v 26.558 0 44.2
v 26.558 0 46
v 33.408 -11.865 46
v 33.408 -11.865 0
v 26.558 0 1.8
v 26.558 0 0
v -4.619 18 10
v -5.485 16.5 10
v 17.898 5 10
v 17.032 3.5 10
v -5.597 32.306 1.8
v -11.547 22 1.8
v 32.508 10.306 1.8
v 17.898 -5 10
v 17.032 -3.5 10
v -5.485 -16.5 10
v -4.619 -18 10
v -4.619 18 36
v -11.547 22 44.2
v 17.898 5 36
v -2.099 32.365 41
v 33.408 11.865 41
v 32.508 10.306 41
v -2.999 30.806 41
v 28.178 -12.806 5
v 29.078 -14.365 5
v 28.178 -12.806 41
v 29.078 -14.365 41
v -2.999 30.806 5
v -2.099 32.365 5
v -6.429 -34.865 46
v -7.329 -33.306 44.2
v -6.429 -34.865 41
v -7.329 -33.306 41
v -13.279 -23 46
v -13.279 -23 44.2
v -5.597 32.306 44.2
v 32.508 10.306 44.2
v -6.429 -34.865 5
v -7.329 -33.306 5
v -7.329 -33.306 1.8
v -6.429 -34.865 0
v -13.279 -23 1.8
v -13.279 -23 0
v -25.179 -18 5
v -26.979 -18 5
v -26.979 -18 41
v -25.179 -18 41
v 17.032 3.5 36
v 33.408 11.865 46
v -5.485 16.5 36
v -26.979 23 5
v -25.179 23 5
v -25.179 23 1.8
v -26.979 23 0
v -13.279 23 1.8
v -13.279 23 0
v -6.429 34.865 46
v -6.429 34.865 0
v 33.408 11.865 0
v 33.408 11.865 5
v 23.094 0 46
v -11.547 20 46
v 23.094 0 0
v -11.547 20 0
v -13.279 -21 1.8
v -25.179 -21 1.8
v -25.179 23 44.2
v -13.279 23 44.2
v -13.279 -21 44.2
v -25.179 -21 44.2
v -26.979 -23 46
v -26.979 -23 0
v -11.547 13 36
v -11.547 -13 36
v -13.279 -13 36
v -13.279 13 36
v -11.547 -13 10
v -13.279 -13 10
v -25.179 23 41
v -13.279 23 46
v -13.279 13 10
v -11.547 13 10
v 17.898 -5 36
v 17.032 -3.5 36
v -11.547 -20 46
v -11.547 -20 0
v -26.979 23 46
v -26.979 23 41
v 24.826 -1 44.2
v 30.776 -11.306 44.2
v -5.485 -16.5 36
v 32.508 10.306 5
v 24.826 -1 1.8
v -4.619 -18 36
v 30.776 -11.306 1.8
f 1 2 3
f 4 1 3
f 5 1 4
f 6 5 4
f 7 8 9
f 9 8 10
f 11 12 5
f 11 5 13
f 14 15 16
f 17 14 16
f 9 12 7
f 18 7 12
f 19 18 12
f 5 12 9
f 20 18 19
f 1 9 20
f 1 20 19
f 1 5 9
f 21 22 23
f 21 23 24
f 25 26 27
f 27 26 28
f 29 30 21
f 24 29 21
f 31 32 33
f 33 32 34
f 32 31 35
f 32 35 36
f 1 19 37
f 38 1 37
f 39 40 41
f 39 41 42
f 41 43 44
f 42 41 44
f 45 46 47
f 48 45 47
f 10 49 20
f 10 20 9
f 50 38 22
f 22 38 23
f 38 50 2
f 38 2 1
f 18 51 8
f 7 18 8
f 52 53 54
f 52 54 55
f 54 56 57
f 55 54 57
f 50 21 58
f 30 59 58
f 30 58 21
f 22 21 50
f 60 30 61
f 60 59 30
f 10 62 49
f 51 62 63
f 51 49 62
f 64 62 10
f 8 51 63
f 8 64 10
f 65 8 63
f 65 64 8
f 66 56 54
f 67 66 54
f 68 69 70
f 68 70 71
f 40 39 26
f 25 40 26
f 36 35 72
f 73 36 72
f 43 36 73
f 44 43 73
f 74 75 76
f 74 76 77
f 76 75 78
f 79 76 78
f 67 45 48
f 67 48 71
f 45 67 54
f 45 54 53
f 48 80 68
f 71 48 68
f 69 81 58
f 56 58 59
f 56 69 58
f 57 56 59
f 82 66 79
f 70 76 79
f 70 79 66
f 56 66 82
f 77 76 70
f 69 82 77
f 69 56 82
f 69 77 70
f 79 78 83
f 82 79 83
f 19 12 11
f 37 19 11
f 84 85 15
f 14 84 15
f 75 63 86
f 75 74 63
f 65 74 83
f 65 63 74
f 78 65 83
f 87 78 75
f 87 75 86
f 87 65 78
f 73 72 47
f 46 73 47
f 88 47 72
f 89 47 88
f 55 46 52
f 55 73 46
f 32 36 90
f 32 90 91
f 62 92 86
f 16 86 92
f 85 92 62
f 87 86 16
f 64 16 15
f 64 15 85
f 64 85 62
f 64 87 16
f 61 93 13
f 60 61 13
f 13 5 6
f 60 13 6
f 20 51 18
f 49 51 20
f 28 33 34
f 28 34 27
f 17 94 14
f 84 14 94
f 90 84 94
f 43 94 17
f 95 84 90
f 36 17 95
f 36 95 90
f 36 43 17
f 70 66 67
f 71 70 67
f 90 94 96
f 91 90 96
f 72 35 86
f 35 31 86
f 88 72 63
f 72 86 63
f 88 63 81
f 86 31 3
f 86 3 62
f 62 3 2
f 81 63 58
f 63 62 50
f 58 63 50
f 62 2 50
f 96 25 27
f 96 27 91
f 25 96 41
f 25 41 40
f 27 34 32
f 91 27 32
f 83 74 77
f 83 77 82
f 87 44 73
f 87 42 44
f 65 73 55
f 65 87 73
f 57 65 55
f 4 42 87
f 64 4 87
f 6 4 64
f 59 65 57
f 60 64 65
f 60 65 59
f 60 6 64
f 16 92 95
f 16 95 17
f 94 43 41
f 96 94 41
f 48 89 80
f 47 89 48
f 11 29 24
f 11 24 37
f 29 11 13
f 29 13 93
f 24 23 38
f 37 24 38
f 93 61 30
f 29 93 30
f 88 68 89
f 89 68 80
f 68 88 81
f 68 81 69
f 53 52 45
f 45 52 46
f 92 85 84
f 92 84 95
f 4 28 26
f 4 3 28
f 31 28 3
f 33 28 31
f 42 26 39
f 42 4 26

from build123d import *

# Parameters (mm, degrees)
PAD_DEPTH           = 46
SKETCH001_W         = 26
SKETCH001_H         = 26
POCKET_DEPTH        = 5
SKETCH002_W         = 26
SKETCH002_H         = 26
POCKET001_DEPTH     = 5
SKETCH003_W         = 26
SKETCH003_H         = 26
POCKET002_DEPTH     = 5
POCKET002_FACE2_W   = 46
POCKET002_FACE2_H   = 46
POCKET002_FACE2_W_2 = 26
POCKET002_FACE2_H_2 = 26
PAD001_DEPTH        = 13.7
PAD001_FACE1_W      = 46
PAD001_FACE1_H      = 46
PAD001_FACE1_W_2    = 26
PAD001_FACE1_H_2    = 26
PAD002_DEPTH        = 13.7
PAD002_FACE16_W     = 46
PAD002_FACE16_H     = 46
PAD002_FACE16_W_2   = 26
PAD002_FACE16_H_2   = 26
PAD003_DEPTH        = 13.7
SKETCH004_W         = 11.9
SKETCH004_H         = 42.4
POCKET003_DEPTH     = 44
SKETCH005_W         = 41
SKETCH005_H         = 36
POCKET004_DEPTH     = 5
SKETCH006_W         = 11.9
SKETCH006_H         = 42.4
POCKET005_DEPTH     = 44
SKETCH007_W         = 41
SKETCH007_H         = 36
POCKET006_DEPTH     = 5
SKETCH008_W         = 11.9
SKETCH008_H         = 42.4
POCKET007_DEPTH     = 44
SKETCH009_W         = 41
SKETCH009_H         = 36
POCKET008_DEPTH     = 5


with BuildPart() as part:
    # Sketch → Pad (new body)
    with BuildSketch(Plane.XY):
        Polygon((26.5581123827, 0), (-13.2790561914, 23), (-13.2790561914, -23), align=None)
        Polygon((23.0940107676, 0), (-11.5470053838, 20), (-11.5470053838, -20), align=None, mode=Mode.SUBTRACT)
    extrude(amount=PAD_DEPTH)

    # Sketch001 (on Face3 of Pad) → Pocket (cut)
    with BuildSketch(Plane(origin=(6.6395280957, -11.5, 0), x_dir=(0.8660254038, 0.5, 0), z_dir=(0.5, -0.8660254038, 0))):
        with Locations((0, 23)):
            Rectangle(SKETCH001_W, SKETCH001_H)
    extrude(amount=-POCKET_DEPTH, mode=Mode.SUBTRACT)

    # Sketch002 (on Face1 of Pocket) → Pocket001 (cut)
    with BuildSketch(Plane(origin=(6.6395280957, 11.5, 0), x_dir=(-0.8660254038, 0.5, 0), z_dir=(0.5, 0.8660254038, 0))):
        with Locations((0, 23)):
            Rectangle(SKETCH002_W, SKETCH002_H)
    extrude(amount=-POCKET001_DEPTH, mode=Mode.SUBTRACT)

    # Sketch003 (on Face5 of Pocket001) → Pocket002 (cut)
    with BuildSketch(Plane(origin=(-13.2790561914, 0, 0), x_dir=(0, -1, 0), z_dir=(-1, 0, 0))):
        with Locations((0, 23)):
            Rectangle(SKETCH003_W, SKETCH003_H)
    extrude(amount=-POCKET002_DEPTH, mode=Mode.SUBTRACT)

    # Pocket002 Face2 → Pad001 (add)
    with BuildSketch(Plane(origin=(6.6395280957, -11.5, 23), x_dir=(-0.8660254038, -0.5, 0), z_dir=(0.5, -0.8660254038, 0))):
        Rectangle(POCKET002_FACE2_W, POCKET002_FACE2_H)
        Rectangle(POCKET002_FACE2_W_2, POCKET002_FACE2_H_2, mode=Mode.SUBTRACT)
    extrude(amount=PAD001_DEPTH)

    # Pad001 Face1 → Pad002 (add)
    with BuildSketch(Plane(origin=(6.6395280957, 11.5, 23), x_dir=(0.8660254038, -0.5, 0), z_dir=(0.5, 0.8660254038, 0))):
        Rectangle(PAD001_FACE1_W, PAD001_FACE1_H)
        Rectangle(PAD001_FACE1_W_2, PAD001_FACE1_H_2, mode=Mode.SUBTRACT)
    extrude(amount=PAD002_DEPTH)

    # Pad002 Face16 → Pad003 (add)
    with BuildSketch(Plane(origin=(-13.2790561914, 0, 23), x_dir=(0, 1, 0), z_dir=(-1, 0, 0))):
        Rectangle(PAD002_FACE16_W, PAD002_FACE16_H)
        Rectangle(PAD002_FACE16_W_2, PAD002_FACE16_H_2, mode=Mode.SUBTRACT)
    extrude(amount=PAD003_DEPTH)

    # Sketch004 (on Face4 of Pad003) → Pocket003 (cut)
    with BuildSketch(Plane(origin=(19.918584287, -11.5, 0), x_dir=(0.5, 0.8660254038, 0), z_dir=(0.8660254038, -0.5, 0))):
        with Locations((19.2290561914, 23)):
            Rectangle(SKETCH004_W, SKETCH004_H)
    extrude(amount=-POCKET003_DEPTH, mode=Mode.SUBTRACT)

    # Sketch005 (on Face14 of Pocket003) → Pocket004 (cut)
    with BuildSketch(Plane(origin=(13.4895280957, 23.3645480318, 0), x_dir=(-0.8660254038, 0.5, 0), z_dir=(0.5, 0.8660254038, 0))):
        with Locations((-2.5, 23)):
            Rectangle(SKETCH005_W, SKETCH005_H)
    extrude(amount=-POCKET004_DEPTH, mode=Mode.SUBTRACT)

    # Sketch006 (on Face41 of Pocket004) → Pocket005 (cut)
    with BuildSketch(Plane(origin=(0, 23, 0), x_dir=(-1, 0, 0), z_dir=(0, 1, 0))):
        with Locations((19.2290561914, 23)):
            Rectangle(SKETCH006_W, SKETCH006_H)
    extrude(amount=-POCKET005_DEPTH, mode=Mode.SUBTRACT)

    # Sketch007 (on Face40 of Pocket005) → Pocket006 (cut)
    with BuildSketch(Plane(origin=(-26.9790561914, 0, 0), x_dir=(0, -1, 0), z_dir=(-1, 0, 0))):
        with Locations((-2.5, 23)):
            Rectangle(SKETCH007_W, SKETCH007_H)
    extrude(amount=-POCKET006_DEPTH, mode=Mode.SUBTRACT)

    # Sketch008 (on Face8 of Pocket006) → Pocket007 (cut)
    with BuildSketch(Plane(origin=(-19.918584287, -11.5, 0), x_dir=(0.5, -0.8660254038, 0), z_dir=(-0.8660254038, -0.5, 0))):
        with Locations((19.2290561914, 23)):
            Rectangle(SKETCH008_W, SKETCH008_H)
    extrude(amount=-POCKET007_DEPTH, mode=Mode.SUBTRACT)

    # Sketch009 (on Face7 of Pocket007) → Pocket008 (cut)
    with BuildSketch(Plane(origin=(13.4895280957, -23.3645480318, 0), x_dir=(0.8660254038, 0.5, 0), z_dir=(0.5, -0.8660254038, 0))):
        with Locations((-2.5, 23)):
            Rectangle(SKETCH009_W, SKETCH009_H)
    extrude(amount=-POCKET008_DEPTH, mode=Mode.SUBTRACT)


solid = part.part
